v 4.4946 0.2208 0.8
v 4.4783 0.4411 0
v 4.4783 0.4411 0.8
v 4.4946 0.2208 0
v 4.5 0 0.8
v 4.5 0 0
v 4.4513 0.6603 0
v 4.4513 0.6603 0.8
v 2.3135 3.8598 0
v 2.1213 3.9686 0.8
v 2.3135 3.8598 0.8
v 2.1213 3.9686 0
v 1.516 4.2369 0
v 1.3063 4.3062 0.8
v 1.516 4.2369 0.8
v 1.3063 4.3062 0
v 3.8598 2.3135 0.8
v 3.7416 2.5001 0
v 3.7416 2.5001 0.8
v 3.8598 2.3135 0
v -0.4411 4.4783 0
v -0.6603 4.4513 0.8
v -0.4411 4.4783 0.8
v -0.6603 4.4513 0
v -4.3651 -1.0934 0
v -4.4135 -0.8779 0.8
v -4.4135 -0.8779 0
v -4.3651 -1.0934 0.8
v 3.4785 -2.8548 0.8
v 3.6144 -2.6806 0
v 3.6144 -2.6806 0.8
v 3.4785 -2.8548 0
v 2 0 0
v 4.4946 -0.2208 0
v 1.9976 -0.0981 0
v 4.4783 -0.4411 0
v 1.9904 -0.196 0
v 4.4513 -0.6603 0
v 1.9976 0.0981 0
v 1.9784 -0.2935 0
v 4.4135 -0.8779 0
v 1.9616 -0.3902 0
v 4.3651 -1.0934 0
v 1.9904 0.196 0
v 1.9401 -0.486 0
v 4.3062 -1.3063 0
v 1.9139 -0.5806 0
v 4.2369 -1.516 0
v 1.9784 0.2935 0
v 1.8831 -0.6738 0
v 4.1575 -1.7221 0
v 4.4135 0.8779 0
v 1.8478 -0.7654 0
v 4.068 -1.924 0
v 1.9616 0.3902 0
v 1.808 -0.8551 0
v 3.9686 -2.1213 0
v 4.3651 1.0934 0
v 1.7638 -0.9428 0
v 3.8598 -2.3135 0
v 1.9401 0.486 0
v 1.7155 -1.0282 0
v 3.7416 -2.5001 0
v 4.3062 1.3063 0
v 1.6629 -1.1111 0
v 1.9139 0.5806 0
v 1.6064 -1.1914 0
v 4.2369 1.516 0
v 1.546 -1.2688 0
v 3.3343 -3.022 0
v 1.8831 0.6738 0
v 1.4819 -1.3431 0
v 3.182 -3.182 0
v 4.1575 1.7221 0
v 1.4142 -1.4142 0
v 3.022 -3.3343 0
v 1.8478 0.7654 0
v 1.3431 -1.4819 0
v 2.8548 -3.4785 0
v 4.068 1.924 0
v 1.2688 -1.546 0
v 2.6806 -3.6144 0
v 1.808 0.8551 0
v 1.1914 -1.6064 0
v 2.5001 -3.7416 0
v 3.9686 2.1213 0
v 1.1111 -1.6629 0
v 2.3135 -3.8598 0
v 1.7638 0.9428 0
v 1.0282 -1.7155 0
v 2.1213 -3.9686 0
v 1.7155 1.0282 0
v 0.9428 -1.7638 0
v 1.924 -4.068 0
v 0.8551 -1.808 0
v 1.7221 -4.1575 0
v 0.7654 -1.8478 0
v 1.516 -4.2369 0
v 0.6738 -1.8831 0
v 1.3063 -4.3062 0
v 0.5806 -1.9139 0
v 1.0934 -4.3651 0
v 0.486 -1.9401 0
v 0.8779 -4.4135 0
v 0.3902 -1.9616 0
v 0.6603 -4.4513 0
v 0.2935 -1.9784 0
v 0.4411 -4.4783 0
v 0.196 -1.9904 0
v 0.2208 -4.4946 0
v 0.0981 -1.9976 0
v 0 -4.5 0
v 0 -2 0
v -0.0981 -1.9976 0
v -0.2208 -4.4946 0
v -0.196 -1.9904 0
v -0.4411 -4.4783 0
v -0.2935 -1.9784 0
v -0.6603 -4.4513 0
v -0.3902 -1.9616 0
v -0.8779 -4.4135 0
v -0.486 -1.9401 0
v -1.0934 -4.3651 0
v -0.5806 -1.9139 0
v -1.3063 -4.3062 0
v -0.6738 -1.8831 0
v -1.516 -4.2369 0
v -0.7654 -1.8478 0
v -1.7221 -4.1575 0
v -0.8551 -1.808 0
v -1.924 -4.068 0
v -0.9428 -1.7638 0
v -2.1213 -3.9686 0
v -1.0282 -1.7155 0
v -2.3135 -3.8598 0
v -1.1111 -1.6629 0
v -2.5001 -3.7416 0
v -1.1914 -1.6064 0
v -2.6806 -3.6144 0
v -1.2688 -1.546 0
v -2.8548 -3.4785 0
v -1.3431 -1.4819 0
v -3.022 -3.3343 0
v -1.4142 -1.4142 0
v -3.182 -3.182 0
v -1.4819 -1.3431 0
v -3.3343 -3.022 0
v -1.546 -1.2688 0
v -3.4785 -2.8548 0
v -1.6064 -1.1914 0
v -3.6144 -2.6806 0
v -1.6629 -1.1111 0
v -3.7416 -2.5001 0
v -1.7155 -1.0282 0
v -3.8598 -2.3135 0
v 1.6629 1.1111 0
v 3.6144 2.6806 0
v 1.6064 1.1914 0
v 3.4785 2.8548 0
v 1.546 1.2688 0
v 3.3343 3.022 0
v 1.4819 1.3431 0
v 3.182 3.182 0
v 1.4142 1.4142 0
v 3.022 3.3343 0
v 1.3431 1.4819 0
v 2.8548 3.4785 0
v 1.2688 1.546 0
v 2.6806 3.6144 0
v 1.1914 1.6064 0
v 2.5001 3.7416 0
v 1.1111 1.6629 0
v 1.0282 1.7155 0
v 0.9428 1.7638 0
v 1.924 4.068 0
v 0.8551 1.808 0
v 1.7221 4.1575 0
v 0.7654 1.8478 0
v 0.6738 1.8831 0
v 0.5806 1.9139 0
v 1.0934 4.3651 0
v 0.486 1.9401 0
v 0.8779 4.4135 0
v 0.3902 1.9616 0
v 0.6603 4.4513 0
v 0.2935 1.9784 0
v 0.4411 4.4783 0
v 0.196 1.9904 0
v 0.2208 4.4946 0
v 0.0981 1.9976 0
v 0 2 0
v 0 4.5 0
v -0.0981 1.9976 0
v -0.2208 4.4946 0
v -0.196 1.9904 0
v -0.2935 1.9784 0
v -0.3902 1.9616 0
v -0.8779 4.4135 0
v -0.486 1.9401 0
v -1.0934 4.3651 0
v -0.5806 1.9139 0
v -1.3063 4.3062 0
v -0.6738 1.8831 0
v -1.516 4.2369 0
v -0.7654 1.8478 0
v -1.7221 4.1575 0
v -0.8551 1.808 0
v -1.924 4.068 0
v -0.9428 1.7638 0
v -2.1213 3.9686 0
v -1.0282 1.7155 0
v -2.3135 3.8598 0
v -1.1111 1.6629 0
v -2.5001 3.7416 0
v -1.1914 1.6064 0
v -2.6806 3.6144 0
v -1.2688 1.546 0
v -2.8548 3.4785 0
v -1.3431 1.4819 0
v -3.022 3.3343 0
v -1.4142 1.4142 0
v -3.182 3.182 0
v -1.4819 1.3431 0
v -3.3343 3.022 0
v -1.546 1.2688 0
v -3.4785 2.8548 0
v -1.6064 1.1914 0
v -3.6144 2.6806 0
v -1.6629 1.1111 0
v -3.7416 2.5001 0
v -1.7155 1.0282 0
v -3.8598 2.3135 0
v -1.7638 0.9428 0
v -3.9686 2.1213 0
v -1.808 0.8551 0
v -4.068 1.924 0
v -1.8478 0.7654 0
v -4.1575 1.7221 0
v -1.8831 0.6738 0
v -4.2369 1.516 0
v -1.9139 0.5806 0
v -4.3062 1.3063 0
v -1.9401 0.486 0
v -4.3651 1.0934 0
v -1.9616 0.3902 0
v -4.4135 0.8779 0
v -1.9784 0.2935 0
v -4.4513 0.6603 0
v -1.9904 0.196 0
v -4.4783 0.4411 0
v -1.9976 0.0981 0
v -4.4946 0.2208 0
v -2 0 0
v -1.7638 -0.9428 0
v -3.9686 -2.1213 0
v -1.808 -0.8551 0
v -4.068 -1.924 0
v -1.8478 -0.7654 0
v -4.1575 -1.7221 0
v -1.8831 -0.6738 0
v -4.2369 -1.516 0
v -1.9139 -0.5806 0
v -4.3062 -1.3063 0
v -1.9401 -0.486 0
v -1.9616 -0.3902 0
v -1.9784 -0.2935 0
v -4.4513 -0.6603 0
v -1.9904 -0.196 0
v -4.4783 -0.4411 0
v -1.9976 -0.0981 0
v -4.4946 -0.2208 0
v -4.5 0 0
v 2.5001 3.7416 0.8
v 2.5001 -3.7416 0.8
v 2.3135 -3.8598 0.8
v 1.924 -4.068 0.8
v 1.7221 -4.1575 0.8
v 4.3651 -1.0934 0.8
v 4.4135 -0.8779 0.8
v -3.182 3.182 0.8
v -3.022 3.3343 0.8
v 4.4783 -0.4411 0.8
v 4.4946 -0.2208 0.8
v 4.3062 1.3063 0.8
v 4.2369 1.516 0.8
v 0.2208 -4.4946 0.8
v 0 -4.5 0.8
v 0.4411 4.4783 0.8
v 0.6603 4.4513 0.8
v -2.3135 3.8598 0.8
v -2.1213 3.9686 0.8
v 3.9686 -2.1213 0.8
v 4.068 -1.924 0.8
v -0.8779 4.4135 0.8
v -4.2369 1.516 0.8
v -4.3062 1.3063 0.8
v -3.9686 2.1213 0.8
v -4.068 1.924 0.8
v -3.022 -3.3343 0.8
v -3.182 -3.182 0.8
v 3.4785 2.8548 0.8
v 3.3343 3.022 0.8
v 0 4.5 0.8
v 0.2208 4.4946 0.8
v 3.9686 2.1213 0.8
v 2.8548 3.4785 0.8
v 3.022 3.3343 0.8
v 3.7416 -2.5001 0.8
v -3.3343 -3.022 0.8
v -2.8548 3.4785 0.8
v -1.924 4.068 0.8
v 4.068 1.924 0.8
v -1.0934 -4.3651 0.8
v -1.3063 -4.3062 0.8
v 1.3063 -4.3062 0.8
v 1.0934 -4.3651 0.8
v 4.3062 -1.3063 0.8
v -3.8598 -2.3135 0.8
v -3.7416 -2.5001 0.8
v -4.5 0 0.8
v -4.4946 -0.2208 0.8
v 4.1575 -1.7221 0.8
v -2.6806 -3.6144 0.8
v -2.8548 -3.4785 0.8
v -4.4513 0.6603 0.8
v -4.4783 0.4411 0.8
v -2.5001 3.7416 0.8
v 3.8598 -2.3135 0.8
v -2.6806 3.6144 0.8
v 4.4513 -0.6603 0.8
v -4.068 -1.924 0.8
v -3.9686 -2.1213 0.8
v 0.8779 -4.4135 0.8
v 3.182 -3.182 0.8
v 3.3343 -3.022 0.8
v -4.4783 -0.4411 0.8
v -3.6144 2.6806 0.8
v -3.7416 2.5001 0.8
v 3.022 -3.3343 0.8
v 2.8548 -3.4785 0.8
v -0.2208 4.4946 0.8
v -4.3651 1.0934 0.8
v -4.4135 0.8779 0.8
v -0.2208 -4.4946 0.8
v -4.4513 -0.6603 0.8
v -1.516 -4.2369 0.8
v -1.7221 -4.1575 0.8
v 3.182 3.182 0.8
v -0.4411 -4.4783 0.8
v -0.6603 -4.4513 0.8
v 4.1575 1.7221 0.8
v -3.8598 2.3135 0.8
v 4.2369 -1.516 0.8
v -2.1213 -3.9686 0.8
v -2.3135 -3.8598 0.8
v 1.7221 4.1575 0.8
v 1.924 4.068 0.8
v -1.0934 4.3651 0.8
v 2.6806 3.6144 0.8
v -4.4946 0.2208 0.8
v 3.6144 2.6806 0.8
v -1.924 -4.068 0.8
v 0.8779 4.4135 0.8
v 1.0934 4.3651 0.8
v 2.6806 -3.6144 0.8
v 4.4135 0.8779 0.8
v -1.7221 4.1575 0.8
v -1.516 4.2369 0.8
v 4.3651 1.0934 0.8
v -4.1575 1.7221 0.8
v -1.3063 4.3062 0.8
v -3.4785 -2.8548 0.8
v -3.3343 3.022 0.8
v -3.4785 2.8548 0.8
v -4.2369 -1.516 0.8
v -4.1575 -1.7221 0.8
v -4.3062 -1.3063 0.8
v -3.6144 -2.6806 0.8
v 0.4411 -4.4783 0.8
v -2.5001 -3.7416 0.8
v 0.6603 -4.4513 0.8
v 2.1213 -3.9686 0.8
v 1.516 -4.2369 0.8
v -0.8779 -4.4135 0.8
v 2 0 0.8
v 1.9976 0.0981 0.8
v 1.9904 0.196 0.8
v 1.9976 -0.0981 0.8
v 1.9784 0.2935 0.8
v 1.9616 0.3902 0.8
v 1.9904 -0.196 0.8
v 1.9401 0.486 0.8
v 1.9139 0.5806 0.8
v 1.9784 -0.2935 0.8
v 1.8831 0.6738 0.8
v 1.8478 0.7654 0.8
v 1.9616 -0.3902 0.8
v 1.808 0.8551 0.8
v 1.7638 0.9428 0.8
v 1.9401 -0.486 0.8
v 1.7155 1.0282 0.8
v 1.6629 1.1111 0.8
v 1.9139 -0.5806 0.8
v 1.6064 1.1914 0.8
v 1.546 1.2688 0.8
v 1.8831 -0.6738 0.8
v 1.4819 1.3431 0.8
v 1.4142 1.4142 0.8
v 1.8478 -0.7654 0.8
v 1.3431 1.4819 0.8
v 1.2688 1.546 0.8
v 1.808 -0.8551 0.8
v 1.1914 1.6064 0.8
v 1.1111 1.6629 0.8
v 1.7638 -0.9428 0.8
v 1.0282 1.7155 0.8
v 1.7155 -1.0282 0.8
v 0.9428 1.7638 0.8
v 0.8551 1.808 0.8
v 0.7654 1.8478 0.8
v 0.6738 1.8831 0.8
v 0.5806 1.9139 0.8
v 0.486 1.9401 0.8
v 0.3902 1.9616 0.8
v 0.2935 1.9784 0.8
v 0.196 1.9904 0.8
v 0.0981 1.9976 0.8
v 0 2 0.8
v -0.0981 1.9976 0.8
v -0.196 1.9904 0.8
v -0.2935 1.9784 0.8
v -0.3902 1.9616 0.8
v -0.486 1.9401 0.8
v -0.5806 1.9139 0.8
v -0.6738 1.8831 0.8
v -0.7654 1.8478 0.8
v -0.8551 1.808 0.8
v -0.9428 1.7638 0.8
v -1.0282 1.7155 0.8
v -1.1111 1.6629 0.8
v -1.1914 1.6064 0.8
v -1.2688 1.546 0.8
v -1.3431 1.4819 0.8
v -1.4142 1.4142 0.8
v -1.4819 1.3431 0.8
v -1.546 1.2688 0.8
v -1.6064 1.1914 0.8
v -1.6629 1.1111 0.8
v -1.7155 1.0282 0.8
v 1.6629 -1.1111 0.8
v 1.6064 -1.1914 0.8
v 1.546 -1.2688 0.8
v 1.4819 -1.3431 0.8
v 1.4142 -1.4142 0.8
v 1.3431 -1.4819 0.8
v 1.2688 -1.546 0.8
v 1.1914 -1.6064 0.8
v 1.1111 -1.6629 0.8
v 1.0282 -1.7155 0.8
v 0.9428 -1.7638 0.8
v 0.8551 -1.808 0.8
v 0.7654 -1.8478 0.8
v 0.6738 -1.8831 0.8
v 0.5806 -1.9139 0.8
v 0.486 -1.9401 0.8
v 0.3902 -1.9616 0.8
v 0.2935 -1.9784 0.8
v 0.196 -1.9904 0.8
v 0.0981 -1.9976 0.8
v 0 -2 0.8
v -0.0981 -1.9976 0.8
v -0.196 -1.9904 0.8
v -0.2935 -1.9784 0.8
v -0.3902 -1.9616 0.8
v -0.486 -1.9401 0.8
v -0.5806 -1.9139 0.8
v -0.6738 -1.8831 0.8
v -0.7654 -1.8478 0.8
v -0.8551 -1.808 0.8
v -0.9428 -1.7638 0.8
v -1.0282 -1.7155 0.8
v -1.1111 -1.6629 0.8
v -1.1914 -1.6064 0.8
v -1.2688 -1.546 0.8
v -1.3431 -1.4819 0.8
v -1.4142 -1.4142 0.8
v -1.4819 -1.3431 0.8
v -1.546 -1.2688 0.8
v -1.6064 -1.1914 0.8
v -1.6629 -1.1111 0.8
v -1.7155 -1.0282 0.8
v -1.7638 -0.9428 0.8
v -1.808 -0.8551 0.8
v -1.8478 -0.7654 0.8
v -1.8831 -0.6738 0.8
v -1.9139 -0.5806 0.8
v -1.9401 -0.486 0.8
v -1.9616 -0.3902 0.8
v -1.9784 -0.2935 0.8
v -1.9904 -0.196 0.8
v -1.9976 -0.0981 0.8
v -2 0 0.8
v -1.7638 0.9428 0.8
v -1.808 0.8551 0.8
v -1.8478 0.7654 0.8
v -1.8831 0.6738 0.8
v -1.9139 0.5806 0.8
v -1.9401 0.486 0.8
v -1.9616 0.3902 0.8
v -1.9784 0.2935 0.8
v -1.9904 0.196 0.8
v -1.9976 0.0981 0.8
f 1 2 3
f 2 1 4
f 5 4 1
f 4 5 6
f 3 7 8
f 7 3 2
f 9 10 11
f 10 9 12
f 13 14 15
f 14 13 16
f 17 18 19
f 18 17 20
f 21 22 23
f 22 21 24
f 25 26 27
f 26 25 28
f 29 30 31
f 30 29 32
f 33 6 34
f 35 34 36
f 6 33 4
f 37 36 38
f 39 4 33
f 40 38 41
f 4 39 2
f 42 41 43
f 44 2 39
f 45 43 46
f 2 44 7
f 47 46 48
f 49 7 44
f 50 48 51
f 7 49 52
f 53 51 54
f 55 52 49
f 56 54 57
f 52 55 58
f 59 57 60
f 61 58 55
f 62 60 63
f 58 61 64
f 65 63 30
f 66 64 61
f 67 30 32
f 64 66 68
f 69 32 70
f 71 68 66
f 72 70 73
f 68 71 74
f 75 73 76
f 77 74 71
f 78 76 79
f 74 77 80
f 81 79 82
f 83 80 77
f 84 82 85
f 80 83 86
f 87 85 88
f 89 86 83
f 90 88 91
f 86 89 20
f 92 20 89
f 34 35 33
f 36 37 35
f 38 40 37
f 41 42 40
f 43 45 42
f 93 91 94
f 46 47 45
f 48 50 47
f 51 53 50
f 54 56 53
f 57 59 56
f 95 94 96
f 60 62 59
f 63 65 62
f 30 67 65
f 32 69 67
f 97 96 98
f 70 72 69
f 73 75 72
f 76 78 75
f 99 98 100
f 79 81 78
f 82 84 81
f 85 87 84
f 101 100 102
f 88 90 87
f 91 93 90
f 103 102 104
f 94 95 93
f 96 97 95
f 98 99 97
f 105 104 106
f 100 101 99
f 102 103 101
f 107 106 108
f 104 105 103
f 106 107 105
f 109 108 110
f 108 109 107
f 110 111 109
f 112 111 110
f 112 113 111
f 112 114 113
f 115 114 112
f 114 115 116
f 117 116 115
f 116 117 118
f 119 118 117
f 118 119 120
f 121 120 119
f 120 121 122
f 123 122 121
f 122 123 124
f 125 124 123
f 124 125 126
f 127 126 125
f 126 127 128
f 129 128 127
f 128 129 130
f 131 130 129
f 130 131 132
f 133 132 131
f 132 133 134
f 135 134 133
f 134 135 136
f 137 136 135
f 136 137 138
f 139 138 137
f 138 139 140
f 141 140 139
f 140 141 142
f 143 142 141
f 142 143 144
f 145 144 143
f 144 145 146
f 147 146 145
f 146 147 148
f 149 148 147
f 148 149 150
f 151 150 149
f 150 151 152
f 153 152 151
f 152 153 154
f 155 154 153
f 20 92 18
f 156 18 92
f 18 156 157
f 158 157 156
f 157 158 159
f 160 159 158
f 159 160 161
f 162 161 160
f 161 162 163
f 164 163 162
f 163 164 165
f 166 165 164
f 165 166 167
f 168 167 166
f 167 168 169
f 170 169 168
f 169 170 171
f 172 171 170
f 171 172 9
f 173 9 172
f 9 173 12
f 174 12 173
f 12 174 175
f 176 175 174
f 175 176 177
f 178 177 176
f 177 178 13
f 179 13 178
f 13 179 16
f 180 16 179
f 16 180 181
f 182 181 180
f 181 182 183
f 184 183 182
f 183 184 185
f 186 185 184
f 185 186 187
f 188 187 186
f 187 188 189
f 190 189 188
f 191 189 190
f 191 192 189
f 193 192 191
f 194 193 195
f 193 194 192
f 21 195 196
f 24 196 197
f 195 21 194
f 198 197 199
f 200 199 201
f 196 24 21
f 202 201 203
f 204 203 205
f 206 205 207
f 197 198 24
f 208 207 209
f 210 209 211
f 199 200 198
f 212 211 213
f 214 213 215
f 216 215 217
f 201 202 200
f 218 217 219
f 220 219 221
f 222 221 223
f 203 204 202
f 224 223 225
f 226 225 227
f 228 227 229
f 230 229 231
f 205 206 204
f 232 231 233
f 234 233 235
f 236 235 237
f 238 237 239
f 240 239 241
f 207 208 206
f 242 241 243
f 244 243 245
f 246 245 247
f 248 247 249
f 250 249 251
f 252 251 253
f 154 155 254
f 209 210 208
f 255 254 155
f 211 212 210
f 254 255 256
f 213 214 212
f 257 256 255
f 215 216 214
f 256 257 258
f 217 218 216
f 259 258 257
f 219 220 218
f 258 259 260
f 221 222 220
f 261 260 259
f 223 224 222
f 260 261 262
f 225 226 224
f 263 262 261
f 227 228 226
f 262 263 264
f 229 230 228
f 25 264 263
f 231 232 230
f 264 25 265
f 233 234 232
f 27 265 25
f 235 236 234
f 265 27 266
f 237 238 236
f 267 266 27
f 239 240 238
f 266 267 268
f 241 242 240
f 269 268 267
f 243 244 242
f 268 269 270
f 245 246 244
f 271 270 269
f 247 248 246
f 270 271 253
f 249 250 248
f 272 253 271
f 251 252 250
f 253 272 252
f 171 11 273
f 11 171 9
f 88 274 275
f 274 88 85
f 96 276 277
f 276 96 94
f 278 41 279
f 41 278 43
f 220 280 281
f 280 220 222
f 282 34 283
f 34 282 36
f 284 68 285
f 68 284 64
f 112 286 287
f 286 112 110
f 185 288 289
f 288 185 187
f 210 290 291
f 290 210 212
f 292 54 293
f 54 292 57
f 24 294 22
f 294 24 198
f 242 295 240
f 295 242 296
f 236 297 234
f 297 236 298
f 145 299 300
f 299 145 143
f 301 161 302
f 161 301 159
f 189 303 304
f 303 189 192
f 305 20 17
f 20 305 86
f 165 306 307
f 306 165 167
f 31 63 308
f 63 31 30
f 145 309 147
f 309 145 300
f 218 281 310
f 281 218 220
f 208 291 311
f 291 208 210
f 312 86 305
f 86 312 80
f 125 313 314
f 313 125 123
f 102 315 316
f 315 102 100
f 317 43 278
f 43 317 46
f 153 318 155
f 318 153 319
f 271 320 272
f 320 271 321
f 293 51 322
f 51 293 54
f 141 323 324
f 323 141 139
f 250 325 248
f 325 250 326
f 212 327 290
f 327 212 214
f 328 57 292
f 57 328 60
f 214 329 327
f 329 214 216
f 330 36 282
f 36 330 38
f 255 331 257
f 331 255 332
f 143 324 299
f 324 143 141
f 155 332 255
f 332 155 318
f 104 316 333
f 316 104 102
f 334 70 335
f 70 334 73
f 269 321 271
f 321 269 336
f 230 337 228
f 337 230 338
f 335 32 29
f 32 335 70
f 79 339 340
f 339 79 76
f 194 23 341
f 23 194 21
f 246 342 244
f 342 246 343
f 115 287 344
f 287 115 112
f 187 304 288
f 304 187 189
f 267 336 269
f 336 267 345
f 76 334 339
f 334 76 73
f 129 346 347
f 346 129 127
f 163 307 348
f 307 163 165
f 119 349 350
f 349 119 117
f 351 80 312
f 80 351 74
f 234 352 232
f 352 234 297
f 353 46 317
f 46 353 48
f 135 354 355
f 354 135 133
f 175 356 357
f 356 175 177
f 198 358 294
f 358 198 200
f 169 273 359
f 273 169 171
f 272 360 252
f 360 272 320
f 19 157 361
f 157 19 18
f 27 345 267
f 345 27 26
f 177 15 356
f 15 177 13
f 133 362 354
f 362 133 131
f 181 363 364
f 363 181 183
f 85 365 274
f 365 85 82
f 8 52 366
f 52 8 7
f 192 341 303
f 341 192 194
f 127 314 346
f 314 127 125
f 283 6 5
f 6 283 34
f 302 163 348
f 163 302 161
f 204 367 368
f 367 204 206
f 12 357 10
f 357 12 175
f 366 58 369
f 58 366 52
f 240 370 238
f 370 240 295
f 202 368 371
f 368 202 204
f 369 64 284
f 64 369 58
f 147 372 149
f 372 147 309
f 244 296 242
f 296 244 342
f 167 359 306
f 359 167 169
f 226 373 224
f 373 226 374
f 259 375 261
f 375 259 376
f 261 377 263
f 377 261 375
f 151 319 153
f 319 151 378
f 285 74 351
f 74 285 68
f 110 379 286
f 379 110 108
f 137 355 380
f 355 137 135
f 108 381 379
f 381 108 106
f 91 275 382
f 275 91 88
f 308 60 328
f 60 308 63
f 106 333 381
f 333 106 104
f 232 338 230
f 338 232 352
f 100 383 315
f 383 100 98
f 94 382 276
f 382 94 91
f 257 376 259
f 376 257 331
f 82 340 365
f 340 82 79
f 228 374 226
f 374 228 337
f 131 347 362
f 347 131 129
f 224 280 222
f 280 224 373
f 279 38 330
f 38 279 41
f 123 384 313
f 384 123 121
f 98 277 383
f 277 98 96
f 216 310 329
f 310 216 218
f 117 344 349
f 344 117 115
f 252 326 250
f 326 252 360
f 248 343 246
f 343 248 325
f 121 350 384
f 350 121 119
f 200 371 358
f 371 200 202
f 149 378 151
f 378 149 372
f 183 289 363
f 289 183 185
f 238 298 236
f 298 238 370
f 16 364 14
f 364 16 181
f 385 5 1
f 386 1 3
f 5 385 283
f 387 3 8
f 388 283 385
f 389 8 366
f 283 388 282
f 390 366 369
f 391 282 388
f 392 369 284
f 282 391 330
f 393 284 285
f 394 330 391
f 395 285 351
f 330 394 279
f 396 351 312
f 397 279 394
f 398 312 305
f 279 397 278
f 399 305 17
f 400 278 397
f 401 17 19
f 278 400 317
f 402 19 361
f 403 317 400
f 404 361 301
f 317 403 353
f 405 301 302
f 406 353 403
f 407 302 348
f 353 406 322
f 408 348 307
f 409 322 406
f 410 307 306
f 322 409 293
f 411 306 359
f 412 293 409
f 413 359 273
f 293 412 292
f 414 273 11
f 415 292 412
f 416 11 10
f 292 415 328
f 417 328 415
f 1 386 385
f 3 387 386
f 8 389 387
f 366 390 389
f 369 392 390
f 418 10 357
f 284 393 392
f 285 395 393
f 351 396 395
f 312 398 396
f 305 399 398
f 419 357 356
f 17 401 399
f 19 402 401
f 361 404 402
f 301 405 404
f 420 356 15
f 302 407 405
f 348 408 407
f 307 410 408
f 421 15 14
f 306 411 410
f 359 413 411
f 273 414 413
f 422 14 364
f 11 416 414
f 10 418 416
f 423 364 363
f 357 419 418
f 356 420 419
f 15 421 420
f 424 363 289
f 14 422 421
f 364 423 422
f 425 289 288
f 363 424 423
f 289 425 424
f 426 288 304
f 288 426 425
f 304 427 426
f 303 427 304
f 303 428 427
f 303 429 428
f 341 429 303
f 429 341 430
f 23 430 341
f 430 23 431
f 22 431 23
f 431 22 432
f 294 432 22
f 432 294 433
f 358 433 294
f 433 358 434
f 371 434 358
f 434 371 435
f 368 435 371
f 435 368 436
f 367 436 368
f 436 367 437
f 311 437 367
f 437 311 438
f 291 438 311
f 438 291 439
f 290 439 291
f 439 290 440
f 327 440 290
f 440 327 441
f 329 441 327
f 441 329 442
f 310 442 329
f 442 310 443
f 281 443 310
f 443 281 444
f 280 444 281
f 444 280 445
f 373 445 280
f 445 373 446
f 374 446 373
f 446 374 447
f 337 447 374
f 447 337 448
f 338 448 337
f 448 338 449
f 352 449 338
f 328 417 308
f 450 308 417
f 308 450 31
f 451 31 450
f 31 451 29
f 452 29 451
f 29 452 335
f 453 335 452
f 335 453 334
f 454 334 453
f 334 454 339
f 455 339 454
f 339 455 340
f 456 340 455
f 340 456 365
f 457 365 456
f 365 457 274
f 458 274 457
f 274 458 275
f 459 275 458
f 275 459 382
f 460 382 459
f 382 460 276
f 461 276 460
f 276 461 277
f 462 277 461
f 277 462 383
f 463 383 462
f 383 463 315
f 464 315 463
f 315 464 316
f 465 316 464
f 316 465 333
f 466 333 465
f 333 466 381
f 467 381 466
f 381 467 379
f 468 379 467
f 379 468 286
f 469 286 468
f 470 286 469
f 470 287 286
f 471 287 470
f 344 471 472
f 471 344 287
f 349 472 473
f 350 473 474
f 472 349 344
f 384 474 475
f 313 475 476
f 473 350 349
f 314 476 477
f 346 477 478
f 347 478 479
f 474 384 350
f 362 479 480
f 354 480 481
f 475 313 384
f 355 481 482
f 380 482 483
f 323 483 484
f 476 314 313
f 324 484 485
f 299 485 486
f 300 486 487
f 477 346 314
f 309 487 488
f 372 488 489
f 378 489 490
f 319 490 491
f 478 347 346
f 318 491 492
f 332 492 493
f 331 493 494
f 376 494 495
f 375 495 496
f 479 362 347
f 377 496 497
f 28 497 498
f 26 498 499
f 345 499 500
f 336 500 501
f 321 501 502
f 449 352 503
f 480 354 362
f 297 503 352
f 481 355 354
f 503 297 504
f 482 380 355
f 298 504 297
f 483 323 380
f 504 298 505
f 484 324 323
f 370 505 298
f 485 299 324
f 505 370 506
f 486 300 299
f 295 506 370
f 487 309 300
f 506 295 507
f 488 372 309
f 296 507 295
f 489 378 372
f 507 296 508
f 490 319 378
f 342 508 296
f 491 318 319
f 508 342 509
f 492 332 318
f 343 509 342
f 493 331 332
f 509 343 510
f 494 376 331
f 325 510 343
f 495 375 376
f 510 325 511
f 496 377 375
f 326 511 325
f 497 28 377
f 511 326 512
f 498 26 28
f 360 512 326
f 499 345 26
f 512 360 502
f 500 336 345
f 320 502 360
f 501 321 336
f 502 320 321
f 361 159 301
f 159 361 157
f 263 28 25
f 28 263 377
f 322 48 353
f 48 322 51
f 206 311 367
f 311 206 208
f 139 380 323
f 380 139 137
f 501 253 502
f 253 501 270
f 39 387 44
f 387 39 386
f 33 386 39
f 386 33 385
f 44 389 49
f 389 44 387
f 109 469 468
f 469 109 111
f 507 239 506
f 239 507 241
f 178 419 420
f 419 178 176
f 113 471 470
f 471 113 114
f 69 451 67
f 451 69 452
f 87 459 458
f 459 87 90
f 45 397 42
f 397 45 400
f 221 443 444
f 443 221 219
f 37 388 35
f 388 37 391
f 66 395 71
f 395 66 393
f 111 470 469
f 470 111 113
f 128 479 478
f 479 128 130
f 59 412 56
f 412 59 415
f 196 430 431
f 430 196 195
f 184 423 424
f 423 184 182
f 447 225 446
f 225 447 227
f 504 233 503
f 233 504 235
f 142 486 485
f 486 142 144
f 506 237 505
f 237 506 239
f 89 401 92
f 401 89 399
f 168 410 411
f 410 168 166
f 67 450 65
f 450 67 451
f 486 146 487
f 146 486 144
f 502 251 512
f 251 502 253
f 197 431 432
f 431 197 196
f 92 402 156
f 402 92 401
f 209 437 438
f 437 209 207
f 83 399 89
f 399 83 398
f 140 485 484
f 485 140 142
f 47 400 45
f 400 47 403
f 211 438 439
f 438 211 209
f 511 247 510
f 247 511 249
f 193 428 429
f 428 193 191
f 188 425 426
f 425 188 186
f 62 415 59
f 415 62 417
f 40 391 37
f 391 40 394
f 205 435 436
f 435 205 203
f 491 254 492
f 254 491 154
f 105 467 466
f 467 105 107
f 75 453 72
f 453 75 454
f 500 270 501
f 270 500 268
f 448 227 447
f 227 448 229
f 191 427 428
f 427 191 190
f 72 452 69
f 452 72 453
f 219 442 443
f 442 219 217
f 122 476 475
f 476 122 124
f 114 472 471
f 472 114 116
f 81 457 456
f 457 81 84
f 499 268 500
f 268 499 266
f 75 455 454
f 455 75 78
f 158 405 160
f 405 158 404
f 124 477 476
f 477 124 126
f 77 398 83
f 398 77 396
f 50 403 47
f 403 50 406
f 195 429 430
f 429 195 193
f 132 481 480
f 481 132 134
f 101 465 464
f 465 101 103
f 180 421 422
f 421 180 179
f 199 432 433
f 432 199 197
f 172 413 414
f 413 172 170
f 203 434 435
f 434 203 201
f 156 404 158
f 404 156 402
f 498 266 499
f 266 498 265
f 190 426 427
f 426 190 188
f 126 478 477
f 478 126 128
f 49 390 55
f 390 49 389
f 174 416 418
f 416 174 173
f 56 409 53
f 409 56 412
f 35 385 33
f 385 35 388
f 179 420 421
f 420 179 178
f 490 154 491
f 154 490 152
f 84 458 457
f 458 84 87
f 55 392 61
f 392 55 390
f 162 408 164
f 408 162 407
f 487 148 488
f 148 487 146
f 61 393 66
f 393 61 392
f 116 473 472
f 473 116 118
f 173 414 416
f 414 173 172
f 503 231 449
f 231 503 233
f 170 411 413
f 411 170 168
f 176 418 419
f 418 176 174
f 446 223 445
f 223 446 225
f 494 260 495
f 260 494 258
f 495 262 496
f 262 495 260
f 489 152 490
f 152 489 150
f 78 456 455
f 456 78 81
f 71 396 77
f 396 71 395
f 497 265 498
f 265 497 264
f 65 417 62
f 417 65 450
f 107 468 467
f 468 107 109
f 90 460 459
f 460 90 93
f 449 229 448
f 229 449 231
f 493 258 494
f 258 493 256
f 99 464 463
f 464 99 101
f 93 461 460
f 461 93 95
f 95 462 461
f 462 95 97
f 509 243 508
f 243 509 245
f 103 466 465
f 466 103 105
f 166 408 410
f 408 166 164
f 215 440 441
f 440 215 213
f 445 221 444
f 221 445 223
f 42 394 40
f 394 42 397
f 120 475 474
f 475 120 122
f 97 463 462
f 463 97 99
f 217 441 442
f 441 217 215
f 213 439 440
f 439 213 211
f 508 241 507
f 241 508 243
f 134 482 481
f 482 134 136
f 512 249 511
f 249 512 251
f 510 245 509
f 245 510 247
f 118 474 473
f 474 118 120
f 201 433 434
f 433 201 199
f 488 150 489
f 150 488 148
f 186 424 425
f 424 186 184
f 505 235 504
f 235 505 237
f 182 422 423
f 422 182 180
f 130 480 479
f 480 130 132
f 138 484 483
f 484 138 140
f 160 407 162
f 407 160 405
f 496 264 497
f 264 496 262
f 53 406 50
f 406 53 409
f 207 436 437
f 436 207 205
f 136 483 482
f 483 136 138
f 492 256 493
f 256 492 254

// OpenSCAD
$fn = 128;

inner_d = 4.0;
outer_d = 9.0;
thickness = 0.8;

difference() {
  cylinder(d = outer_d, h = thickness);
  translate([0, 0, -0.1])
    cylinder(d = inner_d, h = thickness + 0.2);
}
